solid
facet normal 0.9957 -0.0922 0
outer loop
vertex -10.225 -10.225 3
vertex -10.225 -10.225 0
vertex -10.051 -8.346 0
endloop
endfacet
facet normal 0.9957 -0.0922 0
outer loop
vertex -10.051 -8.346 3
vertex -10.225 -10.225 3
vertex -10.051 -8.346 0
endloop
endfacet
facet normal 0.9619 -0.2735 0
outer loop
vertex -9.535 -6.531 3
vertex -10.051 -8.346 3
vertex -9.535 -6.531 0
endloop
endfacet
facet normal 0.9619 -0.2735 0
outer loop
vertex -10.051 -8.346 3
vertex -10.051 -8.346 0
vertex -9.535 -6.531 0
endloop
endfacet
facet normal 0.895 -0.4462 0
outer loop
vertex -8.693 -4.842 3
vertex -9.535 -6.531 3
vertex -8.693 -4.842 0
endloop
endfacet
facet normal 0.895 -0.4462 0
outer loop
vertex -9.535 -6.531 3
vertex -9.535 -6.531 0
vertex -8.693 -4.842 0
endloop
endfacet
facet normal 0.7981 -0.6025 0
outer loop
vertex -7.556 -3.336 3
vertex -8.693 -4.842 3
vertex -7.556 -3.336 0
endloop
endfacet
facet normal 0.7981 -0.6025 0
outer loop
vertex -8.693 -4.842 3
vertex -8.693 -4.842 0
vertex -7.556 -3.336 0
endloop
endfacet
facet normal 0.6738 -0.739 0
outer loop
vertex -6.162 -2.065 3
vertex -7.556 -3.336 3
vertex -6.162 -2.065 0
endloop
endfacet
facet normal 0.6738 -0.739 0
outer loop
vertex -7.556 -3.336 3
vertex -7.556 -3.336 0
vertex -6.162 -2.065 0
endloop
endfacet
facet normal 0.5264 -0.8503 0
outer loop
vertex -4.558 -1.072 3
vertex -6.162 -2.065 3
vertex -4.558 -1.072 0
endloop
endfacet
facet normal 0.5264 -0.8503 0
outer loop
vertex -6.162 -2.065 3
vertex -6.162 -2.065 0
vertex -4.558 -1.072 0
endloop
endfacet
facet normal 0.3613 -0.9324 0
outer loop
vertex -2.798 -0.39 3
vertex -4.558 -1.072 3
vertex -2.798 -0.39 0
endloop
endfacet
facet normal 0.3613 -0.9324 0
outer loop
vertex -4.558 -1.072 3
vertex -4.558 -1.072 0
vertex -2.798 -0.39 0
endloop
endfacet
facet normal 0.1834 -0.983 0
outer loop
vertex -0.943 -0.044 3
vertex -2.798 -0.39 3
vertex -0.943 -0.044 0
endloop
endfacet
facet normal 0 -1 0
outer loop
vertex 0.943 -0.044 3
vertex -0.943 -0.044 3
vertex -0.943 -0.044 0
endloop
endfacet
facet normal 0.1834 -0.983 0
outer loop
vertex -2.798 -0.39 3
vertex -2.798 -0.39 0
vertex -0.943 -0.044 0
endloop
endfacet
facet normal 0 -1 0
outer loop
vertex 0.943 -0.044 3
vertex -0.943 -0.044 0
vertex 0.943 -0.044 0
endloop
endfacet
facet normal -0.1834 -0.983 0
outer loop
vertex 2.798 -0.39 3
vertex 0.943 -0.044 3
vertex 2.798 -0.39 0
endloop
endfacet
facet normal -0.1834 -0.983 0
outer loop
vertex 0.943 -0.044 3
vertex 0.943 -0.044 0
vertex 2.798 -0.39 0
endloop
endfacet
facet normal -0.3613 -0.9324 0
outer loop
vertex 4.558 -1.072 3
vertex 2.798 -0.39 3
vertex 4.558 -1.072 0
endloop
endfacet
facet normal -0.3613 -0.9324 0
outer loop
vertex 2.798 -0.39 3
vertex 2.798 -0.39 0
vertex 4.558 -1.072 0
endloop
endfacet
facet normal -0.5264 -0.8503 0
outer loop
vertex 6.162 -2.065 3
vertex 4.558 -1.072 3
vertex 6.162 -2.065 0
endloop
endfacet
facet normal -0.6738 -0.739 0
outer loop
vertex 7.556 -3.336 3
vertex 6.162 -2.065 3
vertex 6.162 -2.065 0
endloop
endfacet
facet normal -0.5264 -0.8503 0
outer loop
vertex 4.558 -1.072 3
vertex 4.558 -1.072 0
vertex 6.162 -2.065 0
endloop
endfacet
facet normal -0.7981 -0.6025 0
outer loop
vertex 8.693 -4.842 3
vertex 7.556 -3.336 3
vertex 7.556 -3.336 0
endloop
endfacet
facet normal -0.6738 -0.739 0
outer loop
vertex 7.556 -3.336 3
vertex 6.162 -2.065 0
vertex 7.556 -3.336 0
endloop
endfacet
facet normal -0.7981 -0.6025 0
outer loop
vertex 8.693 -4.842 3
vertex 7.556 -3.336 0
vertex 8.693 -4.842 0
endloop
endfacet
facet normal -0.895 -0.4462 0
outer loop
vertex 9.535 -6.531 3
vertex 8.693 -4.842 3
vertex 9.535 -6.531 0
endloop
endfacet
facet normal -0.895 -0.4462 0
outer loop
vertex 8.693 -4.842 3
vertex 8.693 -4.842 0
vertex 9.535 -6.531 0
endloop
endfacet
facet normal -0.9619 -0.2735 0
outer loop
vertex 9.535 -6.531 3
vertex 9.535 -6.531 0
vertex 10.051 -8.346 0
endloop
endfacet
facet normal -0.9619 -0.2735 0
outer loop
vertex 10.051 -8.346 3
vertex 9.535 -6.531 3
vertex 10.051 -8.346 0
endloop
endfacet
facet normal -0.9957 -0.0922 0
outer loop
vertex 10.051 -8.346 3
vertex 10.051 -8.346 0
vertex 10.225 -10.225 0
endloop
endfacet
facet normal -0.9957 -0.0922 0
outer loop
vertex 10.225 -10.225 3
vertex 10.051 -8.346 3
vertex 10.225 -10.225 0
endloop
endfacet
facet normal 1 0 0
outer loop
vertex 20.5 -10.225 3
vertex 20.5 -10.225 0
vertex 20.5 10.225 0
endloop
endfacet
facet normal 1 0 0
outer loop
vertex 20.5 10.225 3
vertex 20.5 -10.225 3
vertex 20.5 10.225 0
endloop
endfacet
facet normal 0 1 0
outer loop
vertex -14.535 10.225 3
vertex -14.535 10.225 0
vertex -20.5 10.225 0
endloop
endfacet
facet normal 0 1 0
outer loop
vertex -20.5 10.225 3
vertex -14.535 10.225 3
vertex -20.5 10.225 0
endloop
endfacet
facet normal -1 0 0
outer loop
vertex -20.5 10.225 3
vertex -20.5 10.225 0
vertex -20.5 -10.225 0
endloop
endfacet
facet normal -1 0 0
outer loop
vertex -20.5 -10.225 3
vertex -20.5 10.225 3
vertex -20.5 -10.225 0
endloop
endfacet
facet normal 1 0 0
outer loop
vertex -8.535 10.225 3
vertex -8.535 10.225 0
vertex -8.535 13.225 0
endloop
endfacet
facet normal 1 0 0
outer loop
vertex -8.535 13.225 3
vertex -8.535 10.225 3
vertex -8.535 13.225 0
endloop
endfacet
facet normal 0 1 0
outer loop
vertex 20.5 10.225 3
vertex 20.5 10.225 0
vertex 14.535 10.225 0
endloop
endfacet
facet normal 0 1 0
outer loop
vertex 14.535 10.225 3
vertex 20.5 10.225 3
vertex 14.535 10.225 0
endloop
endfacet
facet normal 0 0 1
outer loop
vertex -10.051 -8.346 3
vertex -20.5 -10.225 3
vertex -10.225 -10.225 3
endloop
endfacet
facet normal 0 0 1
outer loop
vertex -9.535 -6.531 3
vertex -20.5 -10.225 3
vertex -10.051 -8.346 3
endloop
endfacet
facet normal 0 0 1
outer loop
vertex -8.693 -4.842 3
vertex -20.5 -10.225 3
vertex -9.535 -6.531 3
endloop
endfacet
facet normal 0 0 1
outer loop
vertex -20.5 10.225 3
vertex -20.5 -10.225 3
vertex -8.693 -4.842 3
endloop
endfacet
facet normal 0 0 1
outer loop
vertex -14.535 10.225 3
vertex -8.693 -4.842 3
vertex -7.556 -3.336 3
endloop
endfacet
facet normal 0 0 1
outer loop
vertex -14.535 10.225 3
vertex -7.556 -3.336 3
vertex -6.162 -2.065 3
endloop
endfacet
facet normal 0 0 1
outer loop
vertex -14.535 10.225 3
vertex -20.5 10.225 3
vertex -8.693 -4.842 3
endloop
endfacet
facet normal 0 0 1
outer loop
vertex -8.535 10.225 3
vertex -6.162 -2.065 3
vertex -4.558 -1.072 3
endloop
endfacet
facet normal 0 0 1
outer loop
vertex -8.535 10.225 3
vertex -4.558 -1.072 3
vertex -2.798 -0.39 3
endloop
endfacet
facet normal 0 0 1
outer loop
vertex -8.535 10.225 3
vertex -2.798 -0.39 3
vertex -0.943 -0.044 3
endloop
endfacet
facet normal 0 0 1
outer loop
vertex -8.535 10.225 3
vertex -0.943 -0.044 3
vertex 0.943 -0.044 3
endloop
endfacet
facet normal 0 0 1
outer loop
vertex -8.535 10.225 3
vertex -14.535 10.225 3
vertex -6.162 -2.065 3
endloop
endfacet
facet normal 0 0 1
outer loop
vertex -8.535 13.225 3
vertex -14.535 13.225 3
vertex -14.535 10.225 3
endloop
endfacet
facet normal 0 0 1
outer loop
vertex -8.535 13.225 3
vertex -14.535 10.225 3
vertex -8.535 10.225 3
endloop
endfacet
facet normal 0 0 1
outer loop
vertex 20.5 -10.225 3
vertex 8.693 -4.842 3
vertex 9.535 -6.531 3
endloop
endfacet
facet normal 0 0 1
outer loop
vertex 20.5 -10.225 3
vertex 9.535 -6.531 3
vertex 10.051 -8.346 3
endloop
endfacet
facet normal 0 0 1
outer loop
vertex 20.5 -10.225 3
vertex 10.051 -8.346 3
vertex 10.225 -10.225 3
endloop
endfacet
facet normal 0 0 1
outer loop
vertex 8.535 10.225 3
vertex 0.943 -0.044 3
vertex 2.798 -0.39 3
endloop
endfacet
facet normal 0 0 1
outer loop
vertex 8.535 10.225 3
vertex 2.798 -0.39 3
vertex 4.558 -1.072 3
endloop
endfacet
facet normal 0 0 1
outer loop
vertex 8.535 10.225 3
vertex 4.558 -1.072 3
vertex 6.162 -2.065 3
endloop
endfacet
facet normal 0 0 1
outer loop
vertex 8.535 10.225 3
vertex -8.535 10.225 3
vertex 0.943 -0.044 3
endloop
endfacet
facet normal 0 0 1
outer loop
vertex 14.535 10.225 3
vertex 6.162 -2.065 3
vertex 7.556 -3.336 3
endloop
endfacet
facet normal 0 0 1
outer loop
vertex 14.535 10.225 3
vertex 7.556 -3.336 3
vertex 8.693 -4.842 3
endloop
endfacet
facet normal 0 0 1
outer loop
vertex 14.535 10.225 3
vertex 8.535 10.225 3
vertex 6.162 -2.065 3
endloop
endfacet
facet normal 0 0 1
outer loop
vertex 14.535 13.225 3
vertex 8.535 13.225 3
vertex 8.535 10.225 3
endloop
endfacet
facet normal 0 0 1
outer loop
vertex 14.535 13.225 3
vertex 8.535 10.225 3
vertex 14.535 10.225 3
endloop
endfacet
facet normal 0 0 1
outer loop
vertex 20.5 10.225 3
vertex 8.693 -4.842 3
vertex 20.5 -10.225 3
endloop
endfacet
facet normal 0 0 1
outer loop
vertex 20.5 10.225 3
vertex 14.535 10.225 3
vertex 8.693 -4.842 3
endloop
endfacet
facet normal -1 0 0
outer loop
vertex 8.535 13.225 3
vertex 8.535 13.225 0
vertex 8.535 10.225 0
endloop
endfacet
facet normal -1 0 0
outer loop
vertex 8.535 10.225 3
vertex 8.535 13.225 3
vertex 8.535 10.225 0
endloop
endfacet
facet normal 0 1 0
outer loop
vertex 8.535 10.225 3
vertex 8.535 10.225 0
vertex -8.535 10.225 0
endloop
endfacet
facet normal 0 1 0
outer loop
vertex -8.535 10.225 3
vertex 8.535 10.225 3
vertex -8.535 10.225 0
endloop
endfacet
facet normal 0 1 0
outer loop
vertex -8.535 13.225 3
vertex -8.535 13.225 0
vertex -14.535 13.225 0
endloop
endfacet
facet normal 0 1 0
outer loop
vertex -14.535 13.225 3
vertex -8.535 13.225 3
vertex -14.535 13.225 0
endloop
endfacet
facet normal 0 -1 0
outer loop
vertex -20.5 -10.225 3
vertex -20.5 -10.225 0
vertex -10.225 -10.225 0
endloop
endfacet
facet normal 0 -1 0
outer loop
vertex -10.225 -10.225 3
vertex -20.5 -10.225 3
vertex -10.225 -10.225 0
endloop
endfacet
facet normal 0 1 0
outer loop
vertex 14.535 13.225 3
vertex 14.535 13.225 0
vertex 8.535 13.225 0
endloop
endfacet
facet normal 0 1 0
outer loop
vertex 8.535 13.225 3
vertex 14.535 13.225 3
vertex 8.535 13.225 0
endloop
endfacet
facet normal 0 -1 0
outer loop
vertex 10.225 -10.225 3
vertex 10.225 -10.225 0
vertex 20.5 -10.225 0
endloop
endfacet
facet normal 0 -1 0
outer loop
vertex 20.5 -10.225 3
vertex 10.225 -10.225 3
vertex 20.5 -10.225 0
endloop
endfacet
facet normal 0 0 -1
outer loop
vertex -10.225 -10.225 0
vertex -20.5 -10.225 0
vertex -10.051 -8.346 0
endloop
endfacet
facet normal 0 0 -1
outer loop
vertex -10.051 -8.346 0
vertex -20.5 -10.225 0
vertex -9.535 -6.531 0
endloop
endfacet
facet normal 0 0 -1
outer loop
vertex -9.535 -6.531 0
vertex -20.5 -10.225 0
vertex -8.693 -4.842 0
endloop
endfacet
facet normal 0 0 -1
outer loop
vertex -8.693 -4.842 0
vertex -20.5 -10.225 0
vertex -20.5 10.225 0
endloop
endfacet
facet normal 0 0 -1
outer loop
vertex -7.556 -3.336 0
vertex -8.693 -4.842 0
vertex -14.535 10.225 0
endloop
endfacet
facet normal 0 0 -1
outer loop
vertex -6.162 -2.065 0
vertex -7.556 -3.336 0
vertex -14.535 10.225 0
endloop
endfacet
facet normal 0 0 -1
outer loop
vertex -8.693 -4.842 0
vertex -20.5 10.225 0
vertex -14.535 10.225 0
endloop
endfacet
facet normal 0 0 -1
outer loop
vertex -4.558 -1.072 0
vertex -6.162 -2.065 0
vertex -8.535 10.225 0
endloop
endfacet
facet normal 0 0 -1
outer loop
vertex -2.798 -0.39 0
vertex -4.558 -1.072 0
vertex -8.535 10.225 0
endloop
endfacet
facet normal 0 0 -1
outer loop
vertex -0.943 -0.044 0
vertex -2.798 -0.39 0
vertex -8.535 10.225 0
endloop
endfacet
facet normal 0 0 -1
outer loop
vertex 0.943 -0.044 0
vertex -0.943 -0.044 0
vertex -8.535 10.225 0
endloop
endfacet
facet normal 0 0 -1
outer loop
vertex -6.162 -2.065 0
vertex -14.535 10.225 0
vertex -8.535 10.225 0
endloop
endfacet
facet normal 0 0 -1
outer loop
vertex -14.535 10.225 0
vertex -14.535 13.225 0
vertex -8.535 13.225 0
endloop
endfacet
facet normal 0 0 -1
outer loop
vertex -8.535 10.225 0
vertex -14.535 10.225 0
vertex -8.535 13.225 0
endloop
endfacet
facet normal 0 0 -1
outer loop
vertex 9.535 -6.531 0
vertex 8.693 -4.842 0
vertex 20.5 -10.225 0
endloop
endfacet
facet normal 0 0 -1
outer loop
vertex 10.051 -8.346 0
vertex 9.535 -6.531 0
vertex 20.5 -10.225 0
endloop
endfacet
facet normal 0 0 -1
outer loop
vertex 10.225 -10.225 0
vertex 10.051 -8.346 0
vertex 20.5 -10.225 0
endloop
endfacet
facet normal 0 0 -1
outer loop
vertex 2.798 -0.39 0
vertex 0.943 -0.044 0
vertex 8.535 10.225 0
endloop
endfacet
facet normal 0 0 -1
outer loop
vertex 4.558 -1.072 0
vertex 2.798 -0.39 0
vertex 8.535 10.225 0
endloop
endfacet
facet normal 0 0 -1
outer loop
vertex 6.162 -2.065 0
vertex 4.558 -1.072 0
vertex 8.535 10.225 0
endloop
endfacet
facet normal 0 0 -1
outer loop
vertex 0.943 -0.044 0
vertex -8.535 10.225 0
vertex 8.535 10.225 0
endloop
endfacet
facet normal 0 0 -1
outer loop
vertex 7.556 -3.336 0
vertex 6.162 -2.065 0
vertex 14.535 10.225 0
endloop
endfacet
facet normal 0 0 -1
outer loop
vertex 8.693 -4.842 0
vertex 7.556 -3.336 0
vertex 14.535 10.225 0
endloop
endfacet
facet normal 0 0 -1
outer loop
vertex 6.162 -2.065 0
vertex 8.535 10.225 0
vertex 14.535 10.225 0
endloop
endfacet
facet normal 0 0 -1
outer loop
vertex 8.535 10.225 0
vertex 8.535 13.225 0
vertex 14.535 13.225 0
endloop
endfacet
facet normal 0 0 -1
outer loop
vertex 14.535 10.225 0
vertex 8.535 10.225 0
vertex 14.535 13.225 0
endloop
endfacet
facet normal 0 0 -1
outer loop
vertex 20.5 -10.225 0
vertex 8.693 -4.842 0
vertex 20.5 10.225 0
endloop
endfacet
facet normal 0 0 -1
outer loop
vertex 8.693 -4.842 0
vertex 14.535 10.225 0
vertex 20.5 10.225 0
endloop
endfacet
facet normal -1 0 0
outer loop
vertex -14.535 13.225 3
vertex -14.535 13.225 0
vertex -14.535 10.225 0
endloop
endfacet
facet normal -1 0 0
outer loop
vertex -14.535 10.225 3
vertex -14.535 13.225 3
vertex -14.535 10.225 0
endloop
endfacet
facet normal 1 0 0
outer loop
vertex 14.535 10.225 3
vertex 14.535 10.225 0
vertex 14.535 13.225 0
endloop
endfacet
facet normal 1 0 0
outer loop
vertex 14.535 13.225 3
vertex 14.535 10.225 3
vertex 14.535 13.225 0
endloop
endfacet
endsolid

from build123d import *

# Parameters (mm, degrees)
BOSS_EXTRUDE1_DEPTH = 3


with BuildPart() as part:
    # Sketch1 → Boss-Extrude1 (new body)
    with BuildSketch(Plane.XY):
        with BuildLine():
            ThreePointArc((-10.225, -10.225), (0, 0), (10.225, -10.225))
            Line((10.225, -10.225), (20.5, -10.225))
            Line((20.5, -10.225), (20.5, 10.225))
            Line((20.5, 10.225), (14.535, 10.225))
            Line((14.535, 10.225), (14.535, 13.225))
            Line((14.535, 13.225), (8.535, 13.225))
            Line((8.535, 13.225), (8.535, 10.225))
            Line((8.535, 10.225), (-8.535, 10.225))
            Line((-8.535, 10.225), (-8.535, 13.225))
            Line((-8.535, 13.225), (-14.535, 13.225))
            Line((-14.535, 13.225), (-14.535, 10.225))
            Line((-14.535, 10.225), (-20.5, 10.225))
            Line((-20.5, 10.225), (-20.5, -10.225))
            Line((-20.5, -10.225), (-10.225, -10.225))
        make_face()
    extrude(amount=BOSS_EXTRUDE1_DEPTH)


solid = part.part
